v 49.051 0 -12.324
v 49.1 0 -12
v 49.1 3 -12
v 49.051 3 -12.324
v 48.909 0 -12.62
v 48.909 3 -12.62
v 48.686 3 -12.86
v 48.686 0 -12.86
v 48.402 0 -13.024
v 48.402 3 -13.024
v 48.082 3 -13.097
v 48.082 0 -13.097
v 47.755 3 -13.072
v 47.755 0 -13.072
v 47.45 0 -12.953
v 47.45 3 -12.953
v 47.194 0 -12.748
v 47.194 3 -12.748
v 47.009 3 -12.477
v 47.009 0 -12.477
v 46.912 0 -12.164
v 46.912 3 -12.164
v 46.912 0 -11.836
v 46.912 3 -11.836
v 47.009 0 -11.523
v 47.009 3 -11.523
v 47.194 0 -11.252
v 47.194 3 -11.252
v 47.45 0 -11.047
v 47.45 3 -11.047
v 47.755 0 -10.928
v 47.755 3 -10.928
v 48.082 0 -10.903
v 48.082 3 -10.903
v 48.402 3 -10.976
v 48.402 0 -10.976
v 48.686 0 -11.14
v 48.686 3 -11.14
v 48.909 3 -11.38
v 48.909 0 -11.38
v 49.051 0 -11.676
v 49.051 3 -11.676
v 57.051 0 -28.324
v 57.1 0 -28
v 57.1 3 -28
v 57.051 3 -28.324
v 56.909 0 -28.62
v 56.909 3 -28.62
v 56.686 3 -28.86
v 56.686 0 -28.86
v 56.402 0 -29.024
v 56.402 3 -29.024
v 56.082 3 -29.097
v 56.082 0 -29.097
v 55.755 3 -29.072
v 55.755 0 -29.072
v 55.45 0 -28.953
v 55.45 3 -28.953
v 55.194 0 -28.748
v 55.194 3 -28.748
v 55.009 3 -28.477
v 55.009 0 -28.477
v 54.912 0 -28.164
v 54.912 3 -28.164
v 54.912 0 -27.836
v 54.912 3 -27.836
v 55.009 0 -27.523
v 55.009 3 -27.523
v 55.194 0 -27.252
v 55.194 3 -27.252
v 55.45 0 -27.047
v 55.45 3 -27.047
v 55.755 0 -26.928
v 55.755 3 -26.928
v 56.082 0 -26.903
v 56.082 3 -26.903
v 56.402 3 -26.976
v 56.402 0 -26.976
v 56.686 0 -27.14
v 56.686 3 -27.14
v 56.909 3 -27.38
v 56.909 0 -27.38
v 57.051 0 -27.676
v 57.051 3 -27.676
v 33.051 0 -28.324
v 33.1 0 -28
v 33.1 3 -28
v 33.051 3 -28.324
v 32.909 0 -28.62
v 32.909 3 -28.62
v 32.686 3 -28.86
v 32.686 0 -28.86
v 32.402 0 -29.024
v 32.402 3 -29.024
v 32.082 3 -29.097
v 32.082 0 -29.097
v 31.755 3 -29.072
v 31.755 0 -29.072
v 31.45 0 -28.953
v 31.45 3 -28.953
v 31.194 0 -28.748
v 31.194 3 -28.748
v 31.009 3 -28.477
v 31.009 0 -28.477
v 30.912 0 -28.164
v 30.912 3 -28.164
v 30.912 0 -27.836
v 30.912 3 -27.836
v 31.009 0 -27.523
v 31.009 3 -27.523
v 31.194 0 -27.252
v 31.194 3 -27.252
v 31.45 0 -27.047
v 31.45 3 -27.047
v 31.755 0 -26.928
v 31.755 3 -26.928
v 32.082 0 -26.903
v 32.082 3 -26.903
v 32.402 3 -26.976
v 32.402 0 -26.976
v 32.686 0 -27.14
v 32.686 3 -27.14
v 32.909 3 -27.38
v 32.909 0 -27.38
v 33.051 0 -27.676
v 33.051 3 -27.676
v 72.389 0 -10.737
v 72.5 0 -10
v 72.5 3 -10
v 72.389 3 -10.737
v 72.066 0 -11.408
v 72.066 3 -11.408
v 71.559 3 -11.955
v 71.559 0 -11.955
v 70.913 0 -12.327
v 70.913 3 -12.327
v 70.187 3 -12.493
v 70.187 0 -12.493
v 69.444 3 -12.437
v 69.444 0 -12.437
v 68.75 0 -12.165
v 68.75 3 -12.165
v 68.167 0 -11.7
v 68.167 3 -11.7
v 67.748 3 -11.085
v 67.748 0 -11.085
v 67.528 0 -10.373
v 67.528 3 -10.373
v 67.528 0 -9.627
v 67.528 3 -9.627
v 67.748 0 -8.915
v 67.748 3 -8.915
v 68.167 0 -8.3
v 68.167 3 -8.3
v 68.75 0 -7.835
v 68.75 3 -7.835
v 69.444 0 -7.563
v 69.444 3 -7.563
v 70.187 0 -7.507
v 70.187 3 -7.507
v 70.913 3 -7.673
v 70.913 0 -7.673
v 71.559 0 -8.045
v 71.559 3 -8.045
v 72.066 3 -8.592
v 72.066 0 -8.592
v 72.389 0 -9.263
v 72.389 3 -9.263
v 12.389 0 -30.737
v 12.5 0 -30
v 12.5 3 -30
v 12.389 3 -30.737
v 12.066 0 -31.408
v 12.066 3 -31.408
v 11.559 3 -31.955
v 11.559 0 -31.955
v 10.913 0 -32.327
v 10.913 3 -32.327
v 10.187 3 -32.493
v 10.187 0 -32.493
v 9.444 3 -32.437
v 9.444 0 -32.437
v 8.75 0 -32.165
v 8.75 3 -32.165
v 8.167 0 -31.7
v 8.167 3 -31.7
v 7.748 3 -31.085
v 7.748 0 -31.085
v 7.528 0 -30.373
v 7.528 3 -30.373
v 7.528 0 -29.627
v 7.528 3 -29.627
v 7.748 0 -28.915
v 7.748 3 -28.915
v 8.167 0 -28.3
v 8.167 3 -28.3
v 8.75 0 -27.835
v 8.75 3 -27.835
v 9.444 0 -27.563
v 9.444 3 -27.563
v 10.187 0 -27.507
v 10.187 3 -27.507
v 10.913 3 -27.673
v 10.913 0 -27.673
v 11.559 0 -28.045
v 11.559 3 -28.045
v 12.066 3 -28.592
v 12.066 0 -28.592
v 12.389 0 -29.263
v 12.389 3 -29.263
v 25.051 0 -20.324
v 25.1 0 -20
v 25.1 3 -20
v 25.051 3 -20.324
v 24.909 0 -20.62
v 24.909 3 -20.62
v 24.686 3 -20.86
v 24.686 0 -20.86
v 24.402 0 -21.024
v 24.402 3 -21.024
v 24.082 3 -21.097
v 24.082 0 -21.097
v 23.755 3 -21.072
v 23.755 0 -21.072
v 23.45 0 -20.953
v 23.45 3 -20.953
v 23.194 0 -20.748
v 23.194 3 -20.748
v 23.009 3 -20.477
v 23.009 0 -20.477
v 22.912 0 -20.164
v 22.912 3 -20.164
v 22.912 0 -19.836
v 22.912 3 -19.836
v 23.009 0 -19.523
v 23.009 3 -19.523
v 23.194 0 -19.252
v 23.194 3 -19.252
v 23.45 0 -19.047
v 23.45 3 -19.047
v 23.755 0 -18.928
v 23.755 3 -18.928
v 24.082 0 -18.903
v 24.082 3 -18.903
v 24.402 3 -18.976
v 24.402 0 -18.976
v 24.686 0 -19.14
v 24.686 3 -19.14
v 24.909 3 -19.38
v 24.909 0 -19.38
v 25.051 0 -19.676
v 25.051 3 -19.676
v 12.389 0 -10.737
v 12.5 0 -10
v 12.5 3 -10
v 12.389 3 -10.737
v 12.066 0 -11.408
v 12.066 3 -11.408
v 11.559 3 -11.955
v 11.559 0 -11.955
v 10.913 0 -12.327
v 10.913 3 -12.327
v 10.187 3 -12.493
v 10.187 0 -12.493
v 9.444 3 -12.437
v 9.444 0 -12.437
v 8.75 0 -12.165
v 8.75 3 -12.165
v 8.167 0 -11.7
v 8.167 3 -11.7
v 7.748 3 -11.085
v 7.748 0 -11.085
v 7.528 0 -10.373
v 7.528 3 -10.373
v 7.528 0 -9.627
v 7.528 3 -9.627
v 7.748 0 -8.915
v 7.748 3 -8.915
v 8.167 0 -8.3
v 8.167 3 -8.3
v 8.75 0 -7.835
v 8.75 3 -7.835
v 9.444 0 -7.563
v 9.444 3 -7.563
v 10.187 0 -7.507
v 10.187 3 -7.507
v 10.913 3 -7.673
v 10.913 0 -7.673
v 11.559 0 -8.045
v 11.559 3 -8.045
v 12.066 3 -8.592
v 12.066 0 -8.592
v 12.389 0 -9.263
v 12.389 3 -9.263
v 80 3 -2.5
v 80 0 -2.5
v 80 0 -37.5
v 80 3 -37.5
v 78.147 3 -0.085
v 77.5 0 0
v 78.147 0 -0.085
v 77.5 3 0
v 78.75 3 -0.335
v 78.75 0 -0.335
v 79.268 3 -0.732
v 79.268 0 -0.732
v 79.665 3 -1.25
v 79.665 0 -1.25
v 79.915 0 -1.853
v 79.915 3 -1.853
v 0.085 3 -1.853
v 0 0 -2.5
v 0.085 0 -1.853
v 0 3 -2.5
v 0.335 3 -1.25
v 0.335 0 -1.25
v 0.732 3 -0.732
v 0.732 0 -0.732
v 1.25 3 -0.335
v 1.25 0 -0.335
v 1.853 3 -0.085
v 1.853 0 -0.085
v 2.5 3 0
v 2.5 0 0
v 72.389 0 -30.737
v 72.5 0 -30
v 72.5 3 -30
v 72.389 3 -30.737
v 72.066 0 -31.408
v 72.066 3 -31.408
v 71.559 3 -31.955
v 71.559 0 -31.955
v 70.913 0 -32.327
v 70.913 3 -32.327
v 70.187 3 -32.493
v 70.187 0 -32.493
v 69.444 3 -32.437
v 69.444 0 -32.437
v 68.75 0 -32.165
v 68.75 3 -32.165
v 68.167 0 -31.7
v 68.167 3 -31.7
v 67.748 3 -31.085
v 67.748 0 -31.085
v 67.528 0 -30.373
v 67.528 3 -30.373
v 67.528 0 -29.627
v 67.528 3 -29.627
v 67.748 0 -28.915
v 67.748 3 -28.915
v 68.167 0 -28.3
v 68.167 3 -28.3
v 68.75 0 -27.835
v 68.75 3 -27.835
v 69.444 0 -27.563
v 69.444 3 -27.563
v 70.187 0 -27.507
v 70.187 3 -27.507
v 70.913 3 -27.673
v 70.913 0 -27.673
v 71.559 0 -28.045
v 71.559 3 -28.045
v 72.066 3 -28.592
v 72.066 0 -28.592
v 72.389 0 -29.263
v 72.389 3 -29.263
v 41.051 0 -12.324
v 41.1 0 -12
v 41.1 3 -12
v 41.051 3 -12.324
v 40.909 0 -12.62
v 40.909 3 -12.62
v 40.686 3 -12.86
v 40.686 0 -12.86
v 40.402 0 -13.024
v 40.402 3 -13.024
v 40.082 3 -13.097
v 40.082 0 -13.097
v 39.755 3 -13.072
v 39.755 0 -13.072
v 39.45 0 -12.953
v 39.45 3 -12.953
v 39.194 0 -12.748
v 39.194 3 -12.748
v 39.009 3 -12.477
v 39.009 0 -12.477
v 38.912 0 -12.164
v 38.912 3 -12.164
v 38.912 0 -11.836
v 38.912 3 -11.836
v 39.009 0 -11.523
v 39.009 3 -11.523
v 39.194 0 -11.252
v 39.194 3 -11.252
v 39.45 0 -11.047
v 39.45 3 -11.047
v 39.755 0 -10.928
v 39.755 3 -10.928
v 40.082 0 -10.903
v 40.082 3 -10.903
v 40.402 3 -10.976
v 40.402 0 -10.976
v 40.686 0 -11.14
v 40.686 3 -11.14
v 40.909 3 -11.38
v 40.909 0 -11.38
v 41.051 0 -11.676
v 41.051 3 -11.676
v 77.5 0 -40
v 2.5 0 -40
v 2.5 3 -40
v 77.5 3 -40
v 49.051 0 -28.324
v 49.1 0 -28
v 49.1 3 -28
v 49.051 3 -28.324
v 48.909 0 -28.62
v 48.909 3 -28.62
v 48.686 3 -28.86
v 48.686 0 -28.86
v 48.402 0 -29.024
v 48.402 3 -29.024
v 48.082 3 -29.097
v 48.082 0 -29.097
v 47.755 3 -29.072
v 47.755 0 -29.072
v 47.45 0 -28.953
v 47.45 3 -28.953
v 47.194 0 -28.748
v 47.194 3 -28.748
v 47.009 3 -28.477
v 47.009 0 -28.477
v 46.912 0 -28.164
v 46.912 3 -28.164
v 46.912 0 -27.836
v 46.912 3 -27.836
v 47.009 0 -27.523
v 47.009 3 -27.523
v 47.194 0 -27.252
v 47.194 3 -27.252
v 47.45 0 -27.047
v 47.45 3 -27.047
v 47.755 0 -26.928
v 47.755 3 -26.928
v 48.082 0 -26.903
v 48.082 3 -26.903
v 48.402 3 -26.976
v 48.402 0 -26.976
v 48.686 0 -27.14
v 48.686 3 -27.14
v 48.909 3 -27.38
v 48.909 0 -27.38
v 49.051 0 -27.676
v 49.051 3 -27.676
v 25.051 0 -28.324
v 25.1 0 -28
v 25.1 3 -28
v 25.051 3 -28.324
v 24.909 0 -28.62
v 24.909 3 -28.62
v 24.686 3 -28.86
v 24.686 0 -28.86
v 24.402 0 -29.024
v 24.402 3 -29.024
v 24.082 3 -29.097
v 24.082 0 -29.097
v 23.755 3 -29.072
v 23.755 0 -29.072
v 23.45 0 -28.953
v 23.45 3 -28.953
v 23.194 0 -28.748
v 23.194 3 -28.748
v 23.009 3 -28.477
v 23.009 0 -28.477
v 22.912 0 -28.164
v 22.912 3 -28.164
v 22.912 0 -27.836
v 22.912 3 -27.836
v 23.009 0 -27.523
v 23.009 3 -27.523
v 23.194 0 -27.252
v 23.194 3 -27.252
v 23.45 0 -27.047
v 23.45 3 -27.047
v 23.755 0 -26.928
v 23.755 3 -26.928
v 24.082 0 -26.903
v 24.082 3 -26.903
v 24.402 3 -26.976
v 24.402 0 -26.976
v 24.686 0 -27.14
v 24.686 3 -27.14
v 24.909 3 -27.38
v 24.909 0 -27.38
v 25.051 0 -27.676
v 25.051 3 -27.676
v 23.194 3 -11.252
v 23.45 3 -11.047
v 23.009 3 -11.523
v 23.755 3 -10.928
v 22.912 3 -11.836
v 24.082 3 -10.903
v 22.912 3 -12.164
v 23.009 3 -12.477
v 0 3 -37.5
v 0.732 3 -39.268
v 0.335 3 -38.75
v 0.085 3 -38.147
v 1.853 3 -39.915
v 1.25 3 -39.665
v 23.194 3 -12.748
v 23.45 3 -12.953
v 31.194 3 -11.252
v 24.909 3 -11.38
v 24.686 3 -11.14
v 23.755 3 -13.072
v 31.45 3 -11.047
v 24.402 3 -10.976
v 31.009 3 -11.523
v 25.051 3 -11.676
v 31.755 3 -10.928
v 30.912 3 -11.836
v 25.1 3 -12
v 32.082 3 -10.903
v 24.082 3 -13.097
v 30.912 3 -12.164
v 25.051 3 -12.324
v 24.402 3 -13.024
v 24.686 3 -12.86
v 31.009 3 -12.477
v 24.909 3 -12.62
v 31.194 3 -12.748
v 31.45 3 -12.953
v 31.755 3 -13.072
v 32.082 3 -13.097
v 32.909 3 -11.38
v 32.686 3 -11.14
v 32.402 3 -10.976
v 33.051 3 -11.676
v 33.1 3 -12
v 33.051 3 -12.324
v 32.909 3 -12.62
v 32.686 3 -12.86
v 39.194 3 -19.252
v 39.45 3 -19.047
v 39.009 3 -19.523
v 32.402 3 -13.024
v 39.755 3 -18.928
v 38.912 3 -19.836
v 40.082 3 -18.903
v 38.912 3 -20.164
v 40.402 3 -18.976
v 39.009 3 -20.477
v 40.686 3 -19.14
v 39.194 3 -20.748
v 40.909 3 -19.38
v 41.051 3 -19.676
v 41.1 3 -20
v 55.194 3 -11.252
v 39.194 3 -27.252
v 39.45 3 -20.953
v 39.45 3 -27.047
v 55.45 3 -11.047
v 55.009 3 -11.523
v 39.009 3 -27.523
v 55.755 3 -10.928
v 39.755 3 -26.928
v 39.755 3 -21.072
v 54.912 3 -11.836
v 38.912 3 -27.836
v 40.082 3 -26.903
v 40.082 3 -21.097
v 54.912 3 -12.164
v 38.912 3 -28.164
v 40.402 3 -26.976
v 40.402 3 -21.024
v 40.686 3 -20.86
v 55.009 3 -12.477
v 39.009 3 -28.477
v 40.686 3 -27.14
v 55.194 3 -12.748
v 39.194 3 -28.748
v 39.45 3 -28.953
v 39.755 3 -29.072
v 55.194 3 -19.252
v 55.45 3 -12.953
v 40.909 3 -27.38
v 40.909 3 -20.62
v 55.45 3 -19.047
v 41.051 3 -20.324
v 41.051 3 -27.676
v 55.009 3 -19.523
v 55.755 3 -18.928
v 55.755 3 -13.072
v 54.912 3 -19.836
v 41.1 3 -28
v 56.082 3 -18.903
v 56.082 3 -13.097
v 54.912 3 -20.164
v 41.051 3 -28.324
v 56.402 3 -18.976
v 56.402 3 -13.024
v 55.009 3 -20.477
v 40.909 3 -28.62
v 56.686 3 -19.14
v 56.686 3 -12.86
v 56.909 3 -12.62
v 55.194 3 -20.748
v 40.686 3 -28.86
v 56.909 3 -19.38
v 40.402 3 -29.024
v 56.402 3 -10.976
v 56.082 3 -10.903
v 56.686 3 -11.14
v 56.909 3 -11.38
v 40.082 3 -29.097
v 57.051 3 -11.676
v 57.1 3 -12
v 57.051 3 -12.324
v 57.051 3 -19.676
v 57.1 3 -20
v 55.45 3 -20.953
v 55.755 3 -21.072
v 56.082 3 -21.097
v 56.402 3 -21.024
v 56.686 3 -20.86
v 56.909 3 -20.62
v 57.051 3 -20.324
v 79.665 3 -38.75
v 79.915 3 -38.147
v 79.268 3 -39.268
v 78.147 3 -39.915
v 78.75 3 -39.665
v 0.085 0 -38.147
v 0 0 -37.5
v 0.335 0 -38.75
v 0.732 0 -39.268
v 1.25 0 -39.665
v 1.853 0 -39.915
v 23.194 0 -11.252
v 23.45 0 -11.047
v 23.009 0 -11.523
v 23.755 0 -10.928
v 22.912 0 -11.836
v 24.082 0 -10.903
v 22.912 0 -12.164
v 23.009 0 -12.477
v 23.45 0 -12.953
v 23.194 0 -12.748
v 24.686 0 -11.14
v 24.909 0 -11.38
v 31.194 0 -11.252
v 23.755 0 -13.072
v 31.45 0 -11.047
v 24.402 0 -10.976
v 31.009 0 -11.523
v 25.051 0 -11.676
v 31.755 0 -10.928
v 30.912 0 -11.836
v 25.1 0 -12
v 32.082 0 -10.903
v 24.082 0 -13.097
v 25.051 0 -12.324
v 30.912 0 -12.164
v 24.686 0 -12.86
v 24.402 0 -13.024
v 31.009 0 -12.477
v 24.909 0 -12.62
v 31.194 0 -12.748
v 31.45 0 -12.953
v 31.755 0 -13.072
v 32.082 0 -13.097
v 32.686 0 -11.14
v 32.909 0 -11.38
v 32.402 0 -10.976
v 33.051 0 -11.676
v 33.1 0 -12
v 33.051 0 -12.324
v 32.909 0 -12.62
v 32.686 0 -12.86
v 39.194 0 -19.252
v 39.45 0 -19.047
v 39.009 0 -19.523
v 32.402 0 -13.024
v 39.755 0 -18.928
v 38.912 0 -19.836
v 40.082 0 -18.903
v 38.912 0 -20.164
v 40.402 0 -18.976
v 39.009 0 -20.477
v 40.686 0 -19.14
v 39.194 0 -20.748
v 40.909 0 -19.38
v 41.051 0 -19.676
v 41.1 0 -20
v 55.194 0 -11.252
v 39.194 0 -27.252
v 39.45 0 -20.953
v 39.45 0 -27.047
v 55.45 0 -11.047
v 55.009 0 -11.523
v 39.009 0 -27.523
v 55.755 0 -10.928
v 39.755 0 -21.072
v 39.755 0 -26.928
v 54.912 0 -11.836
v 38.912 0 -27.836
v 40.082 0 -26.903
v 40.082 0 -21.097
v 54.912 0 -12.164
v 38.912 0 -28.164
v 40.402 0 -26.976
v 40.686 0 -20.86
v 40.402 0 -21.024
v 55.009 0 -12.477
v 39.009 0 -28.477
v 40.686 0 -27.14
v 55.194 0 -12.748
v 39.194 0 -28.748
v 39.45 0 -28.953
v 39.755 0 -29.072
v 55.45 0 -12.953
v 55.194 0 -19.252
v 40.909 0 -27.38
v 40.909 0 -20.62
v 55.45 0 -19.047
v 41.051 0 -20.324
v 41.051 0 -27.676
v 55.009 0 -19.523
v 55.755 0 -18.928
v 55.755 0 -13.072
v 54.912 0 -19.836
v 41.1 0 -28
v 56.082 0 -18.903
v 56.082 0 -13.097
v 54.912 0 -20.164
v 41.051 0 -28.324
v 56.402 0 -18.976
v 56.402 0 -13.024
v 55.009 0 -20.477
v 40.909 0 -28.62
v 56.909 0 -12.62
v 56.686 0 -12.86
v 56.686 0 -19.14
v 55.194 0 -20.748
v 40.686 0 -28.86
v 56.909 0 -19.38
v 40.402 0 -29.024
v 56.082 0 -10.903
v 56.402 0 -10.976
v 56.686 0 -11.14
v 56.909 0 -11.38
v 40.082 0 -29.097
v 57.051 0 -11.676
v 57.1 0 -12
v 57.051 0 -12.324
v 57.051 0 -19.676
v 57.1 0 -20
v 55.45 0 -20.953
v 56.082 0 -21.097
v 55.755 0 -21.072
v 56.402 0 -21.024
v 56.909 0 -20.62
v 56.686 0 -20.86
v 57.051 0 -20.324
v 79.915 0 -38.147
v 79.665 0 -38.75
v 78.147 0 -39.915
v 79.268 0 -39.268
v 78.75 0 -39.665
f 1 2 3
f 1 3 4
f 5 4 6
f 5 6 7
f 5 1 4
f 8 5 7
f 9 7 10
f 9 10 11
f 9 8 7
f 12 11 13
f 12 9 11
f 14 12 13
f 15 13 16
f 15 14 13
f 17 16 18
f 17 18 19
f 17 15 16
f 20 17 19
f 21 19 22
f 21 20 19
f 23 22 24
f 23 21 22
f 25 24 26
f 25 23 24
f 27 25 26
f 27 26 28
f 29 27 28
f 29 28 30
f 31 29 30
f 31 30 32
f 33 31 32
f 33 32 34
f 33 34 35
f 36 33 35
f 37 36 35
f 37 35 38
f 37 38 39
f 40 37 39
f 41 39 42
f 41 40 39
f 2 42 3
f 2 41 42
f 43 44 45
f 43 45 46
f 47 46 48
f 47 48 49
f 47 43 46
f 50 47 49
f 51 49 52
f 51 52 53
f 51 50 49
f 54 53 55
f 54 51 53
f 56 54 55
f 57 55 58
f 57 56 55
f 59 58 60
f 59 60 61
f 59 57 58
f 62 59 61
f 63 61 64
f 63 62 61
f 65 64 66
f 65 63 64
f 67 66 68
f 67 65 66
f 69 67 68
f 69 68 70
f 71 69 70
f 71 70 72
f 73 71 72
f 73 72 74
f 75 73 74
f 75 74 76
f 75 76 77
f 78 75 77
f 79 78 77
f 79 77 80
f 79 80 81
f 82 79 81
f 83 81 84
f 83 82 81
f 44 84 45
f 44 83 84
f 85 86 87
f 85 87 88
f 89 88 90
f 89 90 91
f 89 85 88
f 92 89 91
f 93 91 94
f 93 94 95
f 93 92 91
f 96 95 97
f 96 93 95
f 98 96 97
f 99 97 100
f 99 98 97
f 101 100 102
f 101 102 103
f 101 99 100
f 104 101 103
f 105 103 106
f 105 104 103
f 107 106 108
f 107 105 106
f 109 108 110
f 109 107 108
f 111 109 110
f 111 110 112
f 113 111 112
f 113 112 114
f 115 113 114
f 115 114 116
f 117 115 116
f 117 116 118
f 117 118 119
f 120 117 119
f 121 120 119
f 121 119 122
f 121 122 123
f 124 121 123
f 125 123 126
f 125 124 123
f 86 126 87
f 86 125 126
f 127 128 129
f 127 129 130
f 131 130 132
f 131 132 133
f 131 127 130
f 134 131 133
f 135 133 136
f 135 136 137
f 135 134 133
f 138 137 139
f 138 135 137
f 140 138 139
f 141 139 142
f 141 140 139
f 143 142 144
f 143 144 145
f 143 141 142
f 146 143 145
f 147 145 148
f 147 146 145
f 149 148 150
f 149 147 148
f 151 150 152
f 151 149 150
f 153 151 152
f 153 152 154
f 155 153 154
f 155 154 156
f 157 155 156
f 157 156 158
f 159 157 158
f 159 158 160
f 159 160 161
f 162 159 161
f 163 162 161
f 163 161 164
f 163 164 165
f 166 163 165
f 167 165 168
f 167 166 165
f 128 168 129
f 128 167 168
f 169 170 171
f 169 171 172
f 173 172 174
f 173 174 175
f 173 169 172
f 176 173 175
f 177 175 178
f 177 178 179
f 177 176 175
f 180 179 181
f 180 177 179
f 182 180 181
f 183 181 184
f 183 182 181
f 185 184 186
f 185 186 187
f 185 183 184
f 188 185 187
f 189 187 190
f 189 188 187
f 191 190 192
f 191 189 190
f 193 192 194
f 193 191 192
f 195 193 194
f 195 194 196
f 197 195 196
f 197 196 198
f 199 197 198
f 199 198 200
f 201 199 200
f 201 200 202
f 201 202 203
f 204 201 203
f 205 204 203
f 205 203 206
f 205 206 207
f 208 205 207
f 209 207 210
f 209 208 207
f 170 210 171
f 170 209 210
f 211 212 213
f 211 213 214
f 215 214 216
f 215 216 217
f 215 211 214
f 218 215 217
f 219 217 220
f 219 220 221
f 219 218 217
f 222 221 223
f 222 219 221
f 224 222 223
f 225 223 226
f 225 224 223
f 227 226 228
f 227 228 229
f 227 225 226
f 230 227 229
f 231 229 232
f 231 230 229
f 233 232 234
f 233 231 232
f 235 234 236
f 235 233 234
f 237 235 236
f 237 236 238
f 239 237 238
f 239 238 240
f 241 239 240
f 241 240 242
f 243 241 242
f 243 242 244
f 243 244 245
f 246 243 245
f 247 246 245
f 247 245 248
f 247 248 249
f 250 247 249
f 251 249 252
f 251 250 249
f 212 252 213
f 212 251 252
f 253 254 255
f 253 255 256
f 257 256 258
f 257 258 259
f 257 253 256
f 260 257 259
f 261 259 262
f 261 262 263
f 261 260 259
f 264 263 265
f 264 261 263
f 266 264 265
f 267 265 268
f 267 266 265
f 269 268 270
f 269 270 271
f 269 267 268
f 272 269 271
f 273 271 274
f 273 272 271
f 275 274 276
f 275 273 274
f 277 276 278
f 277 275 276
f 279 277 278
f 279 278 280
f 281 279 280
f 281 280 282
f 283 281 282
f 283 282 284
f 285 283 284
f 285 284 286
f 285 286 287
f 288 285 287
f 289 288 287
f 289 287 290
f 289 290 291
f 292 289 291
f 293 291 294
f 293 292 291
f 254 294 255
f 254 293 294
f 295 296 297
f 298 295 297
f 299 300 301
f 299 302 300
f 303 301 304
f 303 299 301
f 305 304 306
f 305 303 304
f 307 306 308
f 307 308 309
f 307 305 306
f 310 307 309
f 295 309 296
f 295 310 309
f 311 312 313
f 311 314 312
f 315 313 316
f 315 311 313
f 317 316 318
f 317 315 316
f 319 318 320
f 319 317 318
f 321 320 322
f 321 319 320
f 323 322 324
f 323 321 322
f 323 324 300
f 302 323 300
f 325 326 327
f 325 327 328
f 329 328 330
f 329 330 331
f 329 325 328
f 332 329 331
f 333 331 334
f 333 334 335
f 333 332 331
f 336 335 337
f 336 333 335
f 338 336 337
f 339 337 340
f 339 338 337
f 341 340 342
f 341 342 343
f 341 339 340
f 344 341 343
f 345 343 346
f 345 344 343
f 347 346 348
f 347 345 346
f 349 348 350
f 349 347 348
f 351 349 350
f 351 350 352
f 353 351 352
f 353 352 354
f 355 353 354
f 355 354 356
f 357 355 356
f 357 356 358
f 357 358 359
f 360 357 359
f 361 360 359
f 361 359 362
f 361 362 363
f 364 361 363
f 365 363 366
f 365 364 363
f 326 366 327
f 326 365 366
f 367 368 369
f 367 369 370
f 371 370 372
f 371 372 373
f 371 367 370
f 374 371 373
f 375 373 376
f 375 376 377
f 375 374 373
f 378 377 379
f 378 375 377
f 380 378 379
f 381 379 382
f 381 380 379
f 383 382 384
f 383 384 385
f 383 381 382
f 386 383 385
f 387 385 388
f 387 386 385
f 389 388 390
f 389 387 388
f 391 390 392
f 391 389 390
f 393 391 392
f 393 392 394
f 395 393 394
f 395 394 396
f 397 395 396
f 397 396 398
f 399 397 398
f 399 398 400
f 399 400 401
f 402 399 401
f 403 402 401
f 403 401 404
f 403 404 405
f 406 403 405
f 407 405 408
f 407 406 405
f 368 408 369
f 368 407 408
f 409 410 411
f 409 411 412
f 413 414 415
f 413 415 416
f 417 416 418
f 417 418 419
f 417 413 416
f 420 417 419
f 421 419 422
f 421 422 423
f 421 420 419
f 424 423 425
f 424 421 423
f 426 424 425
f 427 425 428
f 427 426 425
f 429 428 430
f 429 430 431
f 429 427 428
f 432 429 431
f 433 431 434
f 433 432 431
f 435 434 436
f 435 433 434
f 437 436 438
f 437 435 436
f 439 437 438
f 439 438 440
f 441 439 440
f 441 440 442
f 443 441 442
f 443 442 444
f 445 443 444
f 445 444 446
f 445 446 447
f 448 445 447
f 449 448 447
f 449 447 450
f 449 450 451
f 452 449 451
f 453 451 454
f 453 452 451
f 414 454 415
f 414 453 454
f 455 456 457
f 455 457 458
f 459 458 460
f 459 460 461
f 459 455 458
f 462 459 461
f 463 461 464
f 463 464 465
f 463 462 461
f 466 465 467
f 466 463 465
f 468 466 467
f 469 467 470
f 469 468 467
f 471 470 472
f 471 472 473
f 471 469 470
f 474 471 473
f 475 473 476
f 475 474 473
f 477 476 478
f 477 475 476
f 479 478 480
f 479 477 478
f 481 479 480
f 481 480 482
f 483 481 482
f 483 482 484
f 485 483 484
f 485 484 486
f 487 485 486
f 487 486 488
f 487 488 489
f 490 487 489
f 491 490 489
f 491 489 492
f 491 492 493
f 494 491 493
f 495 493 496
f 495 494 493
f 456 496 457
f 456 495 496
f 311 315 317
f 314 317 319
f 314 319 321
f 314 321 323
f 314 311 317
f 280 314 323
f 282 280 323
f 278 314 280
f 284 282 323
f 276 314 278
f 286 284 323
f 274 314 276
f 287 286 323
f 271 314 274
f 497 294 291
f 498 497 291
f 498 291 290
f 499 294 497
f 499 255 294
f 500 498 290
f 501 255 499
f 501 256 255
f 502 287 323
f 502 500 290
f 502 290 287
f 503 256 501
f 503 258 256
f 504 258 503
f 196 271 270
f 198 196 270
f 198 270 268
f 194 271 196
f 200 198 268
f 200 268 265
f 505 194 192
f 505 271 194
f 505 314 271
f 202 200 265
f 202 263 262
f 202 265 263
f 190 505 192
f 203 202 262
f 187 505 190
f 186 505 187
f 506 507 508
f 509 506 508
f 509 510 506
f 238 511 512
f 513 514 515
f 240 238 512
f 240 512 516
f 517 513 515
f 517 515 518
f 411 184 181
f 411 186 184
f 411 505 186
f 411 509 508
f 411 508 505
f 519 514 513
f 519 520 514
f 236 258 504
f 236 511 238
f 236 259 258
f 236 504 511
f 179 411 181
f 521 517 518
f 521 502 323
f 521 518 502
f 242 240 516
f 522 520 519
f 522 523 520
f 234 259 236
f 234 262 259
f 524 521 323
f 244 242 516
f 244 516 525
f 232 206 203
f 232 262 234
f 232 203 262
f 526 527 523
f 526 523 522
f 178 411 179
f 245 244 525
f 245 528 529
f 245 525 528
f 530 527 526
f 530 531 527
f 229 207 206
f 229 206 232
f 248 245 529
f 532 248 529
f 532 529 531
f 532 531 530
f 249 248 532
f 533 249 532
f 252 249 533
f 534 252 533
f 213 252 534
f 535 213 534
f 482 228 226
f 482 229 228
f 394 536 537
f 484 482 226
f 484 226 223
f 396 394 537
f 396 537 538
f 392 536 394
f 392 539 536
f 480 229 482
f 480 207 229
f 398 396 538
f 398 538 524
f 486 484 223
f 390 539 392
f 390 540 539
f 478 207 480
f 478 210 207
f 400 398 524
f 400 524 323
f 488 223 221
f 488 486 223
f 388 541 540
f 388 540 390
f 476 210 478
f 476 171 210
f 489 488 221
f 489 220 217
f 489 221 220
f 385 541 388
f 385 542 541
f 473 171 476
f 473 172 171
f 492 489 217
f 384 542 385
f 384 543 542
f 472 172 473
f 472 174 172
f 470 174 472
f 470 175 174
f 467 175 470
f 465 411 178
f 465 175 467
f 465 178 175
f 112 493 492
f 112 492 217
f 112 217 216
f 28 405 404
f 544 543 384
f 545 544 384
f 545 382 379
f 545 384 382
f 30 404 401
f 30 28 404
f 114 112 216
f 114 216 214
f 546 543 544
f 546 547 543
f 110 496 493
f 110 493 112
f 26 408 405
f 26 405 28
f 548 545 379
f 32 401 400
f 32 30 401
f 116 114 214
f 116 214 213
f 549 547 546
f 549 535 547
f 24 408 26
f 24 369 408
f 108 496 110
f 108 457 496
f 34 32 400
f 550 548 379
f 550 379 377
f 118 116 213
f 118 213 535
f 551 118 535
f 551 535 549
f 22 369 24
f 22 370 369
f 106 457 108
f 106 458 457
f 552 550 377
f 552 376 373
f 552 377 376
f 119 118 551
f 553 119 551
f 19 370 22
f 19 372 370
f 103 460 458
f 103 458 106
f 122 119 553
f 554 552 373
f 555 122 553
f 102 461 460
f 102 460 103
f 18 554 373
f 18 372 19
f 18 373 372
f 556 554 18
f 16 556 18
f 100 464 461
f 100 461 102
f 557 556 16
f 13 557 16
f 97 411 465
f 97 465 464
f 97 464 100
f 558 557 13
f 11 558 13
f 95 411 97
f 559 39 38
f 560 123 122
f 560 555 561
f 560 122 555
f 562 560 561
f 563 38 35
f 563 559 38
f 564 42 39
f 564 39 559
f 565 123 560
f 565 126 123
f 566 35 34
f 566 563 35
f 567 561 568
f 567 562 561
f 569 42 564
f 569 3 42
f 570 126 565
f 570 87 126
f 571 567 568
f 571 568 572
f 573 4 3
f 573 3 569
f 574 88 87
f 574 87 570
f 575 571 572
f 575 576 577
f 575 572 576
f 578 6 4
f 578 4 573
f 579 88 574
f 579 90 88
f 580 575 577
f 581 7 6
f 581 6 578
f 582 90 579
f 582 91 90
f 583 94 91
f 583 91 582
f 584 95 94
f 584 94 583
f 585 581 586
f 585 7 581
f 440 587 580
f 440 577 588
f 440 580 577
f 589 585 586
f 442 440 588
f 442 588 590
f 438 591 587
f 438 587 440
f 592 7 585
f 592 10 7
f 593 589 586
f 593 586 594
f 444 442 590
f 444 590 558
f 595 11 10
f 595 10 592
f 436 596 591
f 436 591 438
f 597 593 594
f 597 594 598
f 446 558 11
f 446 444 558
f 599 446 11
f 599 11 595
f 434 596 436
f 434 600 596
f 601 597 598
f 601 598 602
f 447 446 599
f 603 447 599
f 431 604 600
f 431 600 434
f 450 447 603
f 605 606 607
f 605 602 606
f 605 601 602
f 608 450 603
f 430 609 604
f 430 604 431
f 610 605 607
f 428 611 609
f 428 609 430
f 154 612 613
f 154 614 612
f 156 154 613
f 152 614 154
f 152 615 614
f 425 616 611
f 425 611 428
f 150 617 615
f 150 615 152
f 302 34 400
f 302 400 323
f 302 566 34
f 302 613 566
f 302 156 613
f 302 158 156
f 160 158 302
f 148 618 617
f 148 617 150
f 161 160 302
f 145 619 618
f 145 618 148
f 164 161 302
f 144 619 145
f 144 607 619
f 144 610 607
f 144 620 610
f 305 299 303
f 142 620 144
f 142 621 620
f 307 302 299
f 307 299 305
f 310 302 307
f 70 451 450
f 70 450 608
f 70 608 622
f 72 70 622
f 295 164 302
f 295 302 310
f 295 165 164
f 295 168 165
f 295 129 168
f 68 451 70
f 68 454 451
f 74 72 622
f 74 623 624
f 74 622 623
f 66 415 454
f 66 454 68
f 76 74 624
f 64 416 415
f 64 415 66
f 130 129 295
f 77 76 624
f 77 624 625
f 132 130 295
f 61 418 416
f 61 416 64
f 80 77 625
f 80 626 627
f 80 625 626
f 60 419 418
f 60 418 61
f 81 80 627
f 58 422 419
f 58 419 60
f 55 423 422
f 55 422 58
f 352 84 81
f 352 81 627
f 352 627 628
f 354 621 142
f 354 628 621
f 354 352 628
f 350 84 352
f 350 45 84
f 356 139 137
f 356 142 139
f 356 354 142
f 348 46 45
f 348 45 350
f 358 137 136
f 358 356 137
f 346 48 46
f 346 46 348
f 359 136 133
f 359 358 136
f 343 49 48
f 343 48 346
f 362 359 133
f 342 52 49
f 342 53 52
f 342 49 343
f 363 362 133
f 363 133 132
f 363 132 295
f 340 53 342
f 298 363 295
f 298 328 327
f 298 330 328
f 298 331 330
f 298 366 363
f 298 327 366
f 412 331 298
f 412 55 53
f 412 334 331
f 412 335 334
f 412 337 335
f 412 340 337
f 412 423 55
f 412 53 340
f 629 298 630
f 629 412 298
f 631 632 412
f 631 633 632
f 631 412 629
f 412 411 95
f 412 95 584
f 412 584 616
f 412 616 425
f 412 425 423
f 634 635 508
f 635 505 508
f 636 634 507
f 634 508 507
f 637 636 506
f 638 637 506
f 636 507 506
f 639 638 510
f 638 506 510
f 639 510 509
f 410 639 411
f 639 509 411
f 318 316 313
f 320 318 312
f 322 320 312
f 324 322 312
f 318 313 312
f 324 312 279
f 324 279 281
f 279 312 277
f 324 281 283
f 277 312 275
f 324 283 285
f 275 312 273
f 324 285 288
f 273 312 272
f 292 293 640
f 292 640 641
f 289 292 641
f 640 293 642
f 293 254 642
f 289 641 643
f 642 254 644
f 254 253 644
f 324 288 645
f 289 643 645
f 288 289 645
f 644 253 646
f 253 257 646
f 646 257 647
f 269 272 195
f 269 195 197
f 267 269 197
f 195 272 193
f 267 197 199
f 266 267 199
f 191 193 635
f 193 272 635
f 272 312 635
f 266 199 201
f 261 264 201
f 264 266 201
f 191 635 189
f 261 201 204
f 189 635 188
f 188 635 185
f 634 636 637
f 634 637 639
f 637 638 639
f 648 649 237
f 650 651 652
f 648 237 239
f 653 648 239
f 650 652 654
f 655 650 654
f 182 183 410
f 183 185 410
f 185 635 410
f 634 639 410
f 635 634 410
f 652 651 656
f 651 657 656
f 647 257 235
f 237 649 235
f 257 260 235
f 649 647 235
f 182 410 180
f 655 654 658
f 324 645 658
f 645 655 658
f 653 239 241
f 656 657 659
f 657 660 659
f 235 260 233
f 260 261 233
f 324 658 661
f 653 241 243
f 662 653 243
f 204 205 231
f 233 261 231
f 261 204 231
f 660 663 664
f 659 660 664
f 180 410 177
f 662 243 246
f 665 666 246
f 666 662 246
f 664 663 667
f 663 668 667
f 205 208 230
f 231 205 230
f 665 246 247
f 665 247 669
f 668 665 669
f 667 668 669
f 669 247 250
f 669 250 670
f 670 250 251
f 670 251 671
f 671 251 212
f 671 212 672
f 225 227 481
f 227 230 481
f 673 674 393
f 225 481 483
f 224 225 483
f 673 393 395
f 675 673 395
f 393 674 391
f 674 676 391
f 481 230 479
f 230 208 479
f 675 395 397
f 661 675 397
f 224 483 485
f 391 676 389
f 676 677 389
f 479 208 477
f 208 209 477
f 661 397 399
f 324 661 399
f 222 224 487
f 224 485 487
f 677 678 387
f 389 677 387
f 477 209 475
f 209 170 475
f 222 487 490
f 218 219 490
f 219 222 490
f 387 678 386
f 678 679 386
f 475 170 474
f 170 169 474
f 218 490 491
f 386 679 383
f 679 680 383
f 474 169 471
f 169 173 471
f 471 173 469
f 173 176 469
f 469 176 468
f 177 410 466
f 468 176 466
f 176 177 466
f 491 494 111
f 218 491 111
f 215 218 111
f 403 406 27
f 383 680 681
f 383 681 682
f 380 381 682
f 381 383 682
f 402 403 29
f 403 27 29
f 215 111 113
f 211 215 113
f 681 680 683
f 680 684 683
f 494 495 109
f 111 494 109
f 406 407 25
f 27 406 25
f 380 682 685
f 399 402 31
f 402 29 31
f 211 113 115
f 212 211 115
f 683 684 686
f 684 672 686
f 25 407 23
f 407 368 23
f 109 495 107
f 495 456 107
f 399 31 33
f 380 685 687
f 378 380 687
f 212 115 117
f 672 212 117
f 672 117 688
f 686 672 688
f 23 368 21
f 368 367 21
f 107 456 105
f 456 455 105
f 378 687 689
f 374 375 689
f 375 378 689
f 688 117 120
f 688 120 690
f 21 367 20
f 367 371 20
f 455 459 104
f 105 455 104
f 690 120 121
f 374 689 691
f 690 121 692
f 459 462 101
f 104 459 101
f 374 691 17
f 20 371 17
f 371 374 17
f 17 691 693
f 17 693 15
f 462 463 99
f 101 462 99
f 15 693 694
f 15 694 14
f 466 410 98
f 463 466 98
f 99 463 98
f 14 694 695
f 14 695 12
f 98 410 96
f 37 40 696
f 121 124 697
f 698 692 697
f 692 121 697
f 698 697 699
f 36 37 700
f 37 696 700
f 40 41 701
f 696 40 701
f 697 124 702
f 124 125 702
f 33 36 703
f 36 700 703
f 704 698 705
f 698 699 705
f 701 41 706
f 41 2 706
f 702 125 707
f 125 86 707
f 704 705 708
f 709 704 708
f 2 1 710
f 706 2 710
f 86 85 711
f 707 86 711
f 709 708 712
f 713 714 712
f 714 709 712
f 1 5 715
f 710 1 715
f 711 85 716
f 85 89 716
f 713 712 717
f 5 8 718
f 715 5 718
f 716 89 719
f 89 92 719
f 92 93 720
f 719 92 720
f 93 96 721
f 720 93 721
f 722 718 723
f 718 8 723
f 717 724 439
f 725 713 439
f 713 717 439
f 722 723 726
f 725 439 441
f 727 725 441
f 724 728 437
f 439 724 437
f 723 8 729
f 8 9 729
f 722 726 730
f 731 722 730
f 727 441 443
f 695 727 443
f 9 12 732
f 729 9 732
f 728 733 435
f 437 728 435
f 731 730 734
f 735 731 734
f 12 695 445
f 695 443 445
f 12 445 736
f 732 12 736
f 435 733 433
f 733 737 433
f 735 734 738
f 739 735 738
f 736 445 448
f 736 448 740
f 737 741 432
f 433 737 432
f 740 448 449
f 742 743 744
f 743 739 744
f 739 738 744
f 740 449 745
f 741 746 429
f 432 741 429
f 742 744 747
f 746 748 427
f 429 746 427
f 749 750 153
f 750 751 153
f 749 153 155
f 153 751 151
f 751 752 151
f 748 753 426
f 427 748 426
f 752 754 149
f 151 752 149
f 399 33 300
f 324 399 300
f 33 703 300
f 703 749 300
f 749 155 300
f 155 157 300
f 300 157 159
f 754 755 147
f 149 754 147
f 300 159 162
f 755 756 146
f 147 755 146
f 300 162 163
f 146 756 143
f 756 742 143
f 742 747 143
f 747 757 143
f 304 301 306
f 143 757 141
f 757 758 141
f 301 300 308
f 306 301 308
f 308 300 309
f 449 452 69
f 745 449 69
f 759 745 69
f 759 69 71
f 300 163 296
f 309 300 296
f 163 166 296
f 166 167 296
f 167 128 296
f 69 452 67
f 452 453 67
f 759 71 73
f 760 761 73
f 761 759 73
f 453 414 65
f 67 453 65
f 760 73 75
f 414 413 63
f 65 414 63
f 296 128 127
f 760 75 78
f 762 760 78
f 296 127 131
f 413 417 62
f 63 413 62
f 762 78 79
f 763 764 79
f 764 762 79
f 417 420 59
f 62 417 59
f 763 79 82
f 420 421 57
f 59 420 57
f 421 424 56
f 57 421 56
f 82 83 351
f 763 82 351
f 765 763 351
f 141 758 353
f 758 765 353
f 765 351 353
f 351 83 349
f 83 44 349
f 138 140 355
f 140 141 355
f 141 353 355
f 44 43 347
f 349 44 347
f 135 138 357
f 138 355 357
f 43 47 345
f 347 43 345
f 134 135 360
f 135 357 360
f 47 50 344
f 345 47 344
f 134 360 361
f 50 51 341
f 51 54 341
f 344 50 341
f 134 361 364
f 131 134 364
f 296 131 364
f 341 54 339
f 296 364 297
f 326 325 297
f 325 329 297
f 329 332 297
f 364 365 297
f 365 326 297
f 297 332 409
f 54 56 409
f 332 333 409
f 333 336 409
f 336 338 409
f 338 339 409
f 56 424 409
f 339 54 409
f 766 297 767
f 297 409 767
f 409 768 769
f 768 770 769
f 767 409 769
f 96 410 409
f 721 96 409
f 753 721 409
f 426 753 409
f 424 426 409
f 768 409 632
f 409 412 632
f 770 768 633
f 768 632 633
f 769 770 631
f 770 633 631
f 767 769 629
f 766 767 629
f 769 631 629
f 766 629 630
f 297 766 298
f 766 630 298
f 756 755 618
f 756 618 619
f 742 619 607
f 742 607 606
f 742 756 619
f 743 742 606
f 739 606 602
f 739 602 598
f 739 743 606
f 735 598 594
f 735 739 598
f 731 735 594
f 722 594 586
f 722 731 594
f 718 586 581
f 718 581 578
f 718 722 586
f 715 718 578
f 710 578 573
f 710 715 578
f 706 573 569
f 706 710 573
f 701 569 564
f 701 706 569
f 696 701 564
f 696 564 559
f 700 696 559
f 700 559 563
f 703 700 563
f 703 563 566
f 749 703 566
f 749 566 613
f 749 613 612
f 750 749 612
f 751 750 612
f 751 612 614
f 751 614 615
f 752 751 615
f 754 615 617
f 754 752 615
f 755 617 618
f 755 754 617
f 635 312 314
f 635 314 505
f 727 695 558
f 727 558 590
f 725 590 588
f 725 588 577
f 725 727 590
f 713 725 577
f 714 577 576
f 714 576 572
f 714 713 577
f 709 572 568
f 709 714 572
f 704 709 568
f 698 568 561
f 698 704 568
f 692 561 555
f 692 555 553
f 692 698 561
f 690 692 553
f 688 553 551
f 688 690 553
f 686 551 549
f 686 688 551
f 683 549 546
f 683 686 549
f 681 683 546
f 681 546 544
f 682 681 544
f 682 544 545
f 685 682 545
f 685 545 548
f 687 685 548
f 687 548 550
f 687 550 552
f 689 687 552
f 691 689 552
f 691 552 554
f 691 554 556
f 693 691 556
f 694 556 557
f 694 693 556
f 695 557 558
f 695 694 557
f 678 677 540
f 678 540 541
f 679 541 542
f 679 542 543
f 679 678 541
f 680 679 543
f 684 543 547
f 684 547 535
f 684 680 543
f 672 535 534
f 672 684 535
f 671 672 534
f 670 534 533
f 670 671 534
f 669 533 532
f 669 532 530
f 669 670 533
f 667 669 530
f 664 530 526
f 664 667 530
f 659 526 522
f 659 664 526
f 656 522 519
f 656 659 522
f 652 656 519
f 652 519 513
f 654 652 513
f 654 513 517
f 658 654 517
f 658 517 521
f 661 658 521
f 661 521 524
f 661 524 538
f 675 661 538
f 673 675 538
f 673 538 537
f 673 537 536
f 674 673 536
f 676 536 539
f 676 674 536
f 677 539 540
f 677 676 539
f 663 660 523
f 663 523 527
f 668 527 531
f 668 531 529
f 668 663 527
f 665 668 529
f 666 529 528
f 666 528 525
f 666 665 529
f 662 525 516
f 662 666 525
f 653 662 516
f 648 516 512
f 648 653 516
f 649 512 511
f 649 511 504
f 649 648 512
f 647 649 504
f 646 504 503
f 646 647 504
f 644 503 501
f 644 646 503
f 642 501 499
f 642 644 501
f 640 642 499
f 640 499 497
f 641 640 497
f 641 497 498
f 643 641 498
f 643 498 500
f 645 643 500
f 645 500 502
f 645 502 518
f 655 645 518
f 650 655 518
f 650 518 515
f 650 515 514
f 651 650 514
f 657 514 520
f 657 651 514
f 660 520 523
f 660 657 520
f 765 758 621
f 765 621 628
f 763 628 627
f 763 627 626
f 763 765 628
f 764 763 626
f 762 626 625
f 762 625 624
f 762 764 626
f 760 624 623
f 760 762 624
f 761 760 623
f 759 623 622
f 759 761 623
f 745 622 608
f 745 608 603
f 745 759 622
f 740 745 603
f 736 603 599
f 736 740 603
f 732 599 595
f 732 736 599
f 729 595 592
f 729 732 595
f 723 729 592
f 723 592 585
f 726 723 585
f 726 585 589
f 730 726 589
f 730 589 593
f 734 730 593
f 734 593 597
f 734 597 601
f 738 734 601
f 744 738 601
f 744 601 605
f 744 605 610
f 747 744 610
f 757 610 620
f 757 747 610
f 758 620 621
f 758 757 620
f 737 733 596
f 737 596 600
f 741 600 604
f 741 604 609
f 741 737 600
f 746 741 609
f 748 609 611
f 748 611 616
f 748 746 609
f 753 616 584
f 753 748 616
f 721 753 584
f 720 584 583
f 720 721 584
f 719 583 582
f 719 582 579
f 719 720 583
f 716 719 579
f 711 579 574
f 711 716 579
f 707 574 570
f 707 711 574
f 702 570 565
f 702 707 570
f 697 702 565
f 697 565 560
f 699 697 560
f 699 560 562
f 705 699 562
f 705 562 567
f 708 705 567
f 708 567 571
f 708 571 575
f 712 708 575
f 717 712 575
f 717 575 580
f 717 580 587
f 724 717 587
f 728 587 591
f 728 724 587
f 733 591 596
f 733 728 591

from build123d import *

# Parameters (mm, degrees)
ESQUISSE1_W      = 80
ESQUISSE1_H      = 40
ESQUISSE1_R      = 2.5
ESQUISSE1_R_2    = 1.1
EXTRUSION1_DEPTH = 3
CONG_1_R         = 2.5


with BuildPart() as part:
    # Esquisse1 → Extrusion1 (new body)
    with BuildSketch(Plane(origin=(0, 0, 0), x_dir=(1, 0, 0), z_dir=(0, 1, 0))):
        with Locations((40, 20)):
            Rectangle(ESQUISSE1_W, ESQUISSE1_H)
        with Locations((10, 10)):
            Circle(ESQUISSE1_R, mode=Mode.SUBTRACT)
        with Locations((70, 10)):
            Circle(ESQUISSE1_R, mode=Mode.SUBTRACT)
        with Locations((70, 30)):
            Circle(ESQUISSE1_R, mode=Mode.SUBTRACT)
        with Locations((10, 30)):
            Circle(ESQUISSE1_R, mode=Mode.SUBTRACT)
        with Locations((40, 28)):
            Circle(ESQUISSE1_R_2, mode=Mode.SUBTRACT)
        with Locations((48, 28)):
            Circle(ESQUISSE1_R_2, mode=Mode.SUBTRACT)
        with Locations((56, 28)):
            Circle(ESQUISSE1_R_2, mode=Mode.SUBTRACT)
        with Locations((40, 20)):
            Circle(ESQUISSE1_R_2, mode=Mode.SUBTRACT)
        with Locations((24, 12)):
            Circle(ESQUISSE1_R_2, mode=Mode.SUBTRACT)
        with Locations((56, 20)):
            Circle(ESQUISSE1_R_2, mode=Mode.SUBTRACT)
        with Locations((40, 12)):
            Circle(ESQUISSE1_R_2, mode=Mode.SUBTRACT)
        with Locations((48, 12)):
            Circle(ESQUISSE1_R_2, mode=Mode.SUBTRACT)
        with Locations((56, 12)):
            Circle(ESQUISSE1_R_2, mode=Mode.SUBTRACT)
        with Locations((32, 12)):
            Circle(ESQUISSE1_R_2, mode=Mode.SUBTRACT)
        with Locations((24, 20)):
            Circle(ESQUISSE1_R_2, mode=Mode.SUBTRACT)
        with Locations((24, 28)):
            Circle(ESQUISSE1_R_2, mode=Mode.SUBTRACT)
        with Locations((32, 28)):
            Circle(ESQUISSE1_R_2, mode=Mode.SUBTRACT)
    extrude(amount=EXTRUSION1_DEPTH)

    # Congé1
    cong_1_edges = [part.edges().sort_by_distance(p)[0] for p in [
        (0, 1.5, -40),
        (80, 1.5, -40),
        (80, 1.5, 0),
        (0, 1.5, 0),
    ]]
    fillet(cong_1_edges, radius=CONG_1_R)


solid = part.part
